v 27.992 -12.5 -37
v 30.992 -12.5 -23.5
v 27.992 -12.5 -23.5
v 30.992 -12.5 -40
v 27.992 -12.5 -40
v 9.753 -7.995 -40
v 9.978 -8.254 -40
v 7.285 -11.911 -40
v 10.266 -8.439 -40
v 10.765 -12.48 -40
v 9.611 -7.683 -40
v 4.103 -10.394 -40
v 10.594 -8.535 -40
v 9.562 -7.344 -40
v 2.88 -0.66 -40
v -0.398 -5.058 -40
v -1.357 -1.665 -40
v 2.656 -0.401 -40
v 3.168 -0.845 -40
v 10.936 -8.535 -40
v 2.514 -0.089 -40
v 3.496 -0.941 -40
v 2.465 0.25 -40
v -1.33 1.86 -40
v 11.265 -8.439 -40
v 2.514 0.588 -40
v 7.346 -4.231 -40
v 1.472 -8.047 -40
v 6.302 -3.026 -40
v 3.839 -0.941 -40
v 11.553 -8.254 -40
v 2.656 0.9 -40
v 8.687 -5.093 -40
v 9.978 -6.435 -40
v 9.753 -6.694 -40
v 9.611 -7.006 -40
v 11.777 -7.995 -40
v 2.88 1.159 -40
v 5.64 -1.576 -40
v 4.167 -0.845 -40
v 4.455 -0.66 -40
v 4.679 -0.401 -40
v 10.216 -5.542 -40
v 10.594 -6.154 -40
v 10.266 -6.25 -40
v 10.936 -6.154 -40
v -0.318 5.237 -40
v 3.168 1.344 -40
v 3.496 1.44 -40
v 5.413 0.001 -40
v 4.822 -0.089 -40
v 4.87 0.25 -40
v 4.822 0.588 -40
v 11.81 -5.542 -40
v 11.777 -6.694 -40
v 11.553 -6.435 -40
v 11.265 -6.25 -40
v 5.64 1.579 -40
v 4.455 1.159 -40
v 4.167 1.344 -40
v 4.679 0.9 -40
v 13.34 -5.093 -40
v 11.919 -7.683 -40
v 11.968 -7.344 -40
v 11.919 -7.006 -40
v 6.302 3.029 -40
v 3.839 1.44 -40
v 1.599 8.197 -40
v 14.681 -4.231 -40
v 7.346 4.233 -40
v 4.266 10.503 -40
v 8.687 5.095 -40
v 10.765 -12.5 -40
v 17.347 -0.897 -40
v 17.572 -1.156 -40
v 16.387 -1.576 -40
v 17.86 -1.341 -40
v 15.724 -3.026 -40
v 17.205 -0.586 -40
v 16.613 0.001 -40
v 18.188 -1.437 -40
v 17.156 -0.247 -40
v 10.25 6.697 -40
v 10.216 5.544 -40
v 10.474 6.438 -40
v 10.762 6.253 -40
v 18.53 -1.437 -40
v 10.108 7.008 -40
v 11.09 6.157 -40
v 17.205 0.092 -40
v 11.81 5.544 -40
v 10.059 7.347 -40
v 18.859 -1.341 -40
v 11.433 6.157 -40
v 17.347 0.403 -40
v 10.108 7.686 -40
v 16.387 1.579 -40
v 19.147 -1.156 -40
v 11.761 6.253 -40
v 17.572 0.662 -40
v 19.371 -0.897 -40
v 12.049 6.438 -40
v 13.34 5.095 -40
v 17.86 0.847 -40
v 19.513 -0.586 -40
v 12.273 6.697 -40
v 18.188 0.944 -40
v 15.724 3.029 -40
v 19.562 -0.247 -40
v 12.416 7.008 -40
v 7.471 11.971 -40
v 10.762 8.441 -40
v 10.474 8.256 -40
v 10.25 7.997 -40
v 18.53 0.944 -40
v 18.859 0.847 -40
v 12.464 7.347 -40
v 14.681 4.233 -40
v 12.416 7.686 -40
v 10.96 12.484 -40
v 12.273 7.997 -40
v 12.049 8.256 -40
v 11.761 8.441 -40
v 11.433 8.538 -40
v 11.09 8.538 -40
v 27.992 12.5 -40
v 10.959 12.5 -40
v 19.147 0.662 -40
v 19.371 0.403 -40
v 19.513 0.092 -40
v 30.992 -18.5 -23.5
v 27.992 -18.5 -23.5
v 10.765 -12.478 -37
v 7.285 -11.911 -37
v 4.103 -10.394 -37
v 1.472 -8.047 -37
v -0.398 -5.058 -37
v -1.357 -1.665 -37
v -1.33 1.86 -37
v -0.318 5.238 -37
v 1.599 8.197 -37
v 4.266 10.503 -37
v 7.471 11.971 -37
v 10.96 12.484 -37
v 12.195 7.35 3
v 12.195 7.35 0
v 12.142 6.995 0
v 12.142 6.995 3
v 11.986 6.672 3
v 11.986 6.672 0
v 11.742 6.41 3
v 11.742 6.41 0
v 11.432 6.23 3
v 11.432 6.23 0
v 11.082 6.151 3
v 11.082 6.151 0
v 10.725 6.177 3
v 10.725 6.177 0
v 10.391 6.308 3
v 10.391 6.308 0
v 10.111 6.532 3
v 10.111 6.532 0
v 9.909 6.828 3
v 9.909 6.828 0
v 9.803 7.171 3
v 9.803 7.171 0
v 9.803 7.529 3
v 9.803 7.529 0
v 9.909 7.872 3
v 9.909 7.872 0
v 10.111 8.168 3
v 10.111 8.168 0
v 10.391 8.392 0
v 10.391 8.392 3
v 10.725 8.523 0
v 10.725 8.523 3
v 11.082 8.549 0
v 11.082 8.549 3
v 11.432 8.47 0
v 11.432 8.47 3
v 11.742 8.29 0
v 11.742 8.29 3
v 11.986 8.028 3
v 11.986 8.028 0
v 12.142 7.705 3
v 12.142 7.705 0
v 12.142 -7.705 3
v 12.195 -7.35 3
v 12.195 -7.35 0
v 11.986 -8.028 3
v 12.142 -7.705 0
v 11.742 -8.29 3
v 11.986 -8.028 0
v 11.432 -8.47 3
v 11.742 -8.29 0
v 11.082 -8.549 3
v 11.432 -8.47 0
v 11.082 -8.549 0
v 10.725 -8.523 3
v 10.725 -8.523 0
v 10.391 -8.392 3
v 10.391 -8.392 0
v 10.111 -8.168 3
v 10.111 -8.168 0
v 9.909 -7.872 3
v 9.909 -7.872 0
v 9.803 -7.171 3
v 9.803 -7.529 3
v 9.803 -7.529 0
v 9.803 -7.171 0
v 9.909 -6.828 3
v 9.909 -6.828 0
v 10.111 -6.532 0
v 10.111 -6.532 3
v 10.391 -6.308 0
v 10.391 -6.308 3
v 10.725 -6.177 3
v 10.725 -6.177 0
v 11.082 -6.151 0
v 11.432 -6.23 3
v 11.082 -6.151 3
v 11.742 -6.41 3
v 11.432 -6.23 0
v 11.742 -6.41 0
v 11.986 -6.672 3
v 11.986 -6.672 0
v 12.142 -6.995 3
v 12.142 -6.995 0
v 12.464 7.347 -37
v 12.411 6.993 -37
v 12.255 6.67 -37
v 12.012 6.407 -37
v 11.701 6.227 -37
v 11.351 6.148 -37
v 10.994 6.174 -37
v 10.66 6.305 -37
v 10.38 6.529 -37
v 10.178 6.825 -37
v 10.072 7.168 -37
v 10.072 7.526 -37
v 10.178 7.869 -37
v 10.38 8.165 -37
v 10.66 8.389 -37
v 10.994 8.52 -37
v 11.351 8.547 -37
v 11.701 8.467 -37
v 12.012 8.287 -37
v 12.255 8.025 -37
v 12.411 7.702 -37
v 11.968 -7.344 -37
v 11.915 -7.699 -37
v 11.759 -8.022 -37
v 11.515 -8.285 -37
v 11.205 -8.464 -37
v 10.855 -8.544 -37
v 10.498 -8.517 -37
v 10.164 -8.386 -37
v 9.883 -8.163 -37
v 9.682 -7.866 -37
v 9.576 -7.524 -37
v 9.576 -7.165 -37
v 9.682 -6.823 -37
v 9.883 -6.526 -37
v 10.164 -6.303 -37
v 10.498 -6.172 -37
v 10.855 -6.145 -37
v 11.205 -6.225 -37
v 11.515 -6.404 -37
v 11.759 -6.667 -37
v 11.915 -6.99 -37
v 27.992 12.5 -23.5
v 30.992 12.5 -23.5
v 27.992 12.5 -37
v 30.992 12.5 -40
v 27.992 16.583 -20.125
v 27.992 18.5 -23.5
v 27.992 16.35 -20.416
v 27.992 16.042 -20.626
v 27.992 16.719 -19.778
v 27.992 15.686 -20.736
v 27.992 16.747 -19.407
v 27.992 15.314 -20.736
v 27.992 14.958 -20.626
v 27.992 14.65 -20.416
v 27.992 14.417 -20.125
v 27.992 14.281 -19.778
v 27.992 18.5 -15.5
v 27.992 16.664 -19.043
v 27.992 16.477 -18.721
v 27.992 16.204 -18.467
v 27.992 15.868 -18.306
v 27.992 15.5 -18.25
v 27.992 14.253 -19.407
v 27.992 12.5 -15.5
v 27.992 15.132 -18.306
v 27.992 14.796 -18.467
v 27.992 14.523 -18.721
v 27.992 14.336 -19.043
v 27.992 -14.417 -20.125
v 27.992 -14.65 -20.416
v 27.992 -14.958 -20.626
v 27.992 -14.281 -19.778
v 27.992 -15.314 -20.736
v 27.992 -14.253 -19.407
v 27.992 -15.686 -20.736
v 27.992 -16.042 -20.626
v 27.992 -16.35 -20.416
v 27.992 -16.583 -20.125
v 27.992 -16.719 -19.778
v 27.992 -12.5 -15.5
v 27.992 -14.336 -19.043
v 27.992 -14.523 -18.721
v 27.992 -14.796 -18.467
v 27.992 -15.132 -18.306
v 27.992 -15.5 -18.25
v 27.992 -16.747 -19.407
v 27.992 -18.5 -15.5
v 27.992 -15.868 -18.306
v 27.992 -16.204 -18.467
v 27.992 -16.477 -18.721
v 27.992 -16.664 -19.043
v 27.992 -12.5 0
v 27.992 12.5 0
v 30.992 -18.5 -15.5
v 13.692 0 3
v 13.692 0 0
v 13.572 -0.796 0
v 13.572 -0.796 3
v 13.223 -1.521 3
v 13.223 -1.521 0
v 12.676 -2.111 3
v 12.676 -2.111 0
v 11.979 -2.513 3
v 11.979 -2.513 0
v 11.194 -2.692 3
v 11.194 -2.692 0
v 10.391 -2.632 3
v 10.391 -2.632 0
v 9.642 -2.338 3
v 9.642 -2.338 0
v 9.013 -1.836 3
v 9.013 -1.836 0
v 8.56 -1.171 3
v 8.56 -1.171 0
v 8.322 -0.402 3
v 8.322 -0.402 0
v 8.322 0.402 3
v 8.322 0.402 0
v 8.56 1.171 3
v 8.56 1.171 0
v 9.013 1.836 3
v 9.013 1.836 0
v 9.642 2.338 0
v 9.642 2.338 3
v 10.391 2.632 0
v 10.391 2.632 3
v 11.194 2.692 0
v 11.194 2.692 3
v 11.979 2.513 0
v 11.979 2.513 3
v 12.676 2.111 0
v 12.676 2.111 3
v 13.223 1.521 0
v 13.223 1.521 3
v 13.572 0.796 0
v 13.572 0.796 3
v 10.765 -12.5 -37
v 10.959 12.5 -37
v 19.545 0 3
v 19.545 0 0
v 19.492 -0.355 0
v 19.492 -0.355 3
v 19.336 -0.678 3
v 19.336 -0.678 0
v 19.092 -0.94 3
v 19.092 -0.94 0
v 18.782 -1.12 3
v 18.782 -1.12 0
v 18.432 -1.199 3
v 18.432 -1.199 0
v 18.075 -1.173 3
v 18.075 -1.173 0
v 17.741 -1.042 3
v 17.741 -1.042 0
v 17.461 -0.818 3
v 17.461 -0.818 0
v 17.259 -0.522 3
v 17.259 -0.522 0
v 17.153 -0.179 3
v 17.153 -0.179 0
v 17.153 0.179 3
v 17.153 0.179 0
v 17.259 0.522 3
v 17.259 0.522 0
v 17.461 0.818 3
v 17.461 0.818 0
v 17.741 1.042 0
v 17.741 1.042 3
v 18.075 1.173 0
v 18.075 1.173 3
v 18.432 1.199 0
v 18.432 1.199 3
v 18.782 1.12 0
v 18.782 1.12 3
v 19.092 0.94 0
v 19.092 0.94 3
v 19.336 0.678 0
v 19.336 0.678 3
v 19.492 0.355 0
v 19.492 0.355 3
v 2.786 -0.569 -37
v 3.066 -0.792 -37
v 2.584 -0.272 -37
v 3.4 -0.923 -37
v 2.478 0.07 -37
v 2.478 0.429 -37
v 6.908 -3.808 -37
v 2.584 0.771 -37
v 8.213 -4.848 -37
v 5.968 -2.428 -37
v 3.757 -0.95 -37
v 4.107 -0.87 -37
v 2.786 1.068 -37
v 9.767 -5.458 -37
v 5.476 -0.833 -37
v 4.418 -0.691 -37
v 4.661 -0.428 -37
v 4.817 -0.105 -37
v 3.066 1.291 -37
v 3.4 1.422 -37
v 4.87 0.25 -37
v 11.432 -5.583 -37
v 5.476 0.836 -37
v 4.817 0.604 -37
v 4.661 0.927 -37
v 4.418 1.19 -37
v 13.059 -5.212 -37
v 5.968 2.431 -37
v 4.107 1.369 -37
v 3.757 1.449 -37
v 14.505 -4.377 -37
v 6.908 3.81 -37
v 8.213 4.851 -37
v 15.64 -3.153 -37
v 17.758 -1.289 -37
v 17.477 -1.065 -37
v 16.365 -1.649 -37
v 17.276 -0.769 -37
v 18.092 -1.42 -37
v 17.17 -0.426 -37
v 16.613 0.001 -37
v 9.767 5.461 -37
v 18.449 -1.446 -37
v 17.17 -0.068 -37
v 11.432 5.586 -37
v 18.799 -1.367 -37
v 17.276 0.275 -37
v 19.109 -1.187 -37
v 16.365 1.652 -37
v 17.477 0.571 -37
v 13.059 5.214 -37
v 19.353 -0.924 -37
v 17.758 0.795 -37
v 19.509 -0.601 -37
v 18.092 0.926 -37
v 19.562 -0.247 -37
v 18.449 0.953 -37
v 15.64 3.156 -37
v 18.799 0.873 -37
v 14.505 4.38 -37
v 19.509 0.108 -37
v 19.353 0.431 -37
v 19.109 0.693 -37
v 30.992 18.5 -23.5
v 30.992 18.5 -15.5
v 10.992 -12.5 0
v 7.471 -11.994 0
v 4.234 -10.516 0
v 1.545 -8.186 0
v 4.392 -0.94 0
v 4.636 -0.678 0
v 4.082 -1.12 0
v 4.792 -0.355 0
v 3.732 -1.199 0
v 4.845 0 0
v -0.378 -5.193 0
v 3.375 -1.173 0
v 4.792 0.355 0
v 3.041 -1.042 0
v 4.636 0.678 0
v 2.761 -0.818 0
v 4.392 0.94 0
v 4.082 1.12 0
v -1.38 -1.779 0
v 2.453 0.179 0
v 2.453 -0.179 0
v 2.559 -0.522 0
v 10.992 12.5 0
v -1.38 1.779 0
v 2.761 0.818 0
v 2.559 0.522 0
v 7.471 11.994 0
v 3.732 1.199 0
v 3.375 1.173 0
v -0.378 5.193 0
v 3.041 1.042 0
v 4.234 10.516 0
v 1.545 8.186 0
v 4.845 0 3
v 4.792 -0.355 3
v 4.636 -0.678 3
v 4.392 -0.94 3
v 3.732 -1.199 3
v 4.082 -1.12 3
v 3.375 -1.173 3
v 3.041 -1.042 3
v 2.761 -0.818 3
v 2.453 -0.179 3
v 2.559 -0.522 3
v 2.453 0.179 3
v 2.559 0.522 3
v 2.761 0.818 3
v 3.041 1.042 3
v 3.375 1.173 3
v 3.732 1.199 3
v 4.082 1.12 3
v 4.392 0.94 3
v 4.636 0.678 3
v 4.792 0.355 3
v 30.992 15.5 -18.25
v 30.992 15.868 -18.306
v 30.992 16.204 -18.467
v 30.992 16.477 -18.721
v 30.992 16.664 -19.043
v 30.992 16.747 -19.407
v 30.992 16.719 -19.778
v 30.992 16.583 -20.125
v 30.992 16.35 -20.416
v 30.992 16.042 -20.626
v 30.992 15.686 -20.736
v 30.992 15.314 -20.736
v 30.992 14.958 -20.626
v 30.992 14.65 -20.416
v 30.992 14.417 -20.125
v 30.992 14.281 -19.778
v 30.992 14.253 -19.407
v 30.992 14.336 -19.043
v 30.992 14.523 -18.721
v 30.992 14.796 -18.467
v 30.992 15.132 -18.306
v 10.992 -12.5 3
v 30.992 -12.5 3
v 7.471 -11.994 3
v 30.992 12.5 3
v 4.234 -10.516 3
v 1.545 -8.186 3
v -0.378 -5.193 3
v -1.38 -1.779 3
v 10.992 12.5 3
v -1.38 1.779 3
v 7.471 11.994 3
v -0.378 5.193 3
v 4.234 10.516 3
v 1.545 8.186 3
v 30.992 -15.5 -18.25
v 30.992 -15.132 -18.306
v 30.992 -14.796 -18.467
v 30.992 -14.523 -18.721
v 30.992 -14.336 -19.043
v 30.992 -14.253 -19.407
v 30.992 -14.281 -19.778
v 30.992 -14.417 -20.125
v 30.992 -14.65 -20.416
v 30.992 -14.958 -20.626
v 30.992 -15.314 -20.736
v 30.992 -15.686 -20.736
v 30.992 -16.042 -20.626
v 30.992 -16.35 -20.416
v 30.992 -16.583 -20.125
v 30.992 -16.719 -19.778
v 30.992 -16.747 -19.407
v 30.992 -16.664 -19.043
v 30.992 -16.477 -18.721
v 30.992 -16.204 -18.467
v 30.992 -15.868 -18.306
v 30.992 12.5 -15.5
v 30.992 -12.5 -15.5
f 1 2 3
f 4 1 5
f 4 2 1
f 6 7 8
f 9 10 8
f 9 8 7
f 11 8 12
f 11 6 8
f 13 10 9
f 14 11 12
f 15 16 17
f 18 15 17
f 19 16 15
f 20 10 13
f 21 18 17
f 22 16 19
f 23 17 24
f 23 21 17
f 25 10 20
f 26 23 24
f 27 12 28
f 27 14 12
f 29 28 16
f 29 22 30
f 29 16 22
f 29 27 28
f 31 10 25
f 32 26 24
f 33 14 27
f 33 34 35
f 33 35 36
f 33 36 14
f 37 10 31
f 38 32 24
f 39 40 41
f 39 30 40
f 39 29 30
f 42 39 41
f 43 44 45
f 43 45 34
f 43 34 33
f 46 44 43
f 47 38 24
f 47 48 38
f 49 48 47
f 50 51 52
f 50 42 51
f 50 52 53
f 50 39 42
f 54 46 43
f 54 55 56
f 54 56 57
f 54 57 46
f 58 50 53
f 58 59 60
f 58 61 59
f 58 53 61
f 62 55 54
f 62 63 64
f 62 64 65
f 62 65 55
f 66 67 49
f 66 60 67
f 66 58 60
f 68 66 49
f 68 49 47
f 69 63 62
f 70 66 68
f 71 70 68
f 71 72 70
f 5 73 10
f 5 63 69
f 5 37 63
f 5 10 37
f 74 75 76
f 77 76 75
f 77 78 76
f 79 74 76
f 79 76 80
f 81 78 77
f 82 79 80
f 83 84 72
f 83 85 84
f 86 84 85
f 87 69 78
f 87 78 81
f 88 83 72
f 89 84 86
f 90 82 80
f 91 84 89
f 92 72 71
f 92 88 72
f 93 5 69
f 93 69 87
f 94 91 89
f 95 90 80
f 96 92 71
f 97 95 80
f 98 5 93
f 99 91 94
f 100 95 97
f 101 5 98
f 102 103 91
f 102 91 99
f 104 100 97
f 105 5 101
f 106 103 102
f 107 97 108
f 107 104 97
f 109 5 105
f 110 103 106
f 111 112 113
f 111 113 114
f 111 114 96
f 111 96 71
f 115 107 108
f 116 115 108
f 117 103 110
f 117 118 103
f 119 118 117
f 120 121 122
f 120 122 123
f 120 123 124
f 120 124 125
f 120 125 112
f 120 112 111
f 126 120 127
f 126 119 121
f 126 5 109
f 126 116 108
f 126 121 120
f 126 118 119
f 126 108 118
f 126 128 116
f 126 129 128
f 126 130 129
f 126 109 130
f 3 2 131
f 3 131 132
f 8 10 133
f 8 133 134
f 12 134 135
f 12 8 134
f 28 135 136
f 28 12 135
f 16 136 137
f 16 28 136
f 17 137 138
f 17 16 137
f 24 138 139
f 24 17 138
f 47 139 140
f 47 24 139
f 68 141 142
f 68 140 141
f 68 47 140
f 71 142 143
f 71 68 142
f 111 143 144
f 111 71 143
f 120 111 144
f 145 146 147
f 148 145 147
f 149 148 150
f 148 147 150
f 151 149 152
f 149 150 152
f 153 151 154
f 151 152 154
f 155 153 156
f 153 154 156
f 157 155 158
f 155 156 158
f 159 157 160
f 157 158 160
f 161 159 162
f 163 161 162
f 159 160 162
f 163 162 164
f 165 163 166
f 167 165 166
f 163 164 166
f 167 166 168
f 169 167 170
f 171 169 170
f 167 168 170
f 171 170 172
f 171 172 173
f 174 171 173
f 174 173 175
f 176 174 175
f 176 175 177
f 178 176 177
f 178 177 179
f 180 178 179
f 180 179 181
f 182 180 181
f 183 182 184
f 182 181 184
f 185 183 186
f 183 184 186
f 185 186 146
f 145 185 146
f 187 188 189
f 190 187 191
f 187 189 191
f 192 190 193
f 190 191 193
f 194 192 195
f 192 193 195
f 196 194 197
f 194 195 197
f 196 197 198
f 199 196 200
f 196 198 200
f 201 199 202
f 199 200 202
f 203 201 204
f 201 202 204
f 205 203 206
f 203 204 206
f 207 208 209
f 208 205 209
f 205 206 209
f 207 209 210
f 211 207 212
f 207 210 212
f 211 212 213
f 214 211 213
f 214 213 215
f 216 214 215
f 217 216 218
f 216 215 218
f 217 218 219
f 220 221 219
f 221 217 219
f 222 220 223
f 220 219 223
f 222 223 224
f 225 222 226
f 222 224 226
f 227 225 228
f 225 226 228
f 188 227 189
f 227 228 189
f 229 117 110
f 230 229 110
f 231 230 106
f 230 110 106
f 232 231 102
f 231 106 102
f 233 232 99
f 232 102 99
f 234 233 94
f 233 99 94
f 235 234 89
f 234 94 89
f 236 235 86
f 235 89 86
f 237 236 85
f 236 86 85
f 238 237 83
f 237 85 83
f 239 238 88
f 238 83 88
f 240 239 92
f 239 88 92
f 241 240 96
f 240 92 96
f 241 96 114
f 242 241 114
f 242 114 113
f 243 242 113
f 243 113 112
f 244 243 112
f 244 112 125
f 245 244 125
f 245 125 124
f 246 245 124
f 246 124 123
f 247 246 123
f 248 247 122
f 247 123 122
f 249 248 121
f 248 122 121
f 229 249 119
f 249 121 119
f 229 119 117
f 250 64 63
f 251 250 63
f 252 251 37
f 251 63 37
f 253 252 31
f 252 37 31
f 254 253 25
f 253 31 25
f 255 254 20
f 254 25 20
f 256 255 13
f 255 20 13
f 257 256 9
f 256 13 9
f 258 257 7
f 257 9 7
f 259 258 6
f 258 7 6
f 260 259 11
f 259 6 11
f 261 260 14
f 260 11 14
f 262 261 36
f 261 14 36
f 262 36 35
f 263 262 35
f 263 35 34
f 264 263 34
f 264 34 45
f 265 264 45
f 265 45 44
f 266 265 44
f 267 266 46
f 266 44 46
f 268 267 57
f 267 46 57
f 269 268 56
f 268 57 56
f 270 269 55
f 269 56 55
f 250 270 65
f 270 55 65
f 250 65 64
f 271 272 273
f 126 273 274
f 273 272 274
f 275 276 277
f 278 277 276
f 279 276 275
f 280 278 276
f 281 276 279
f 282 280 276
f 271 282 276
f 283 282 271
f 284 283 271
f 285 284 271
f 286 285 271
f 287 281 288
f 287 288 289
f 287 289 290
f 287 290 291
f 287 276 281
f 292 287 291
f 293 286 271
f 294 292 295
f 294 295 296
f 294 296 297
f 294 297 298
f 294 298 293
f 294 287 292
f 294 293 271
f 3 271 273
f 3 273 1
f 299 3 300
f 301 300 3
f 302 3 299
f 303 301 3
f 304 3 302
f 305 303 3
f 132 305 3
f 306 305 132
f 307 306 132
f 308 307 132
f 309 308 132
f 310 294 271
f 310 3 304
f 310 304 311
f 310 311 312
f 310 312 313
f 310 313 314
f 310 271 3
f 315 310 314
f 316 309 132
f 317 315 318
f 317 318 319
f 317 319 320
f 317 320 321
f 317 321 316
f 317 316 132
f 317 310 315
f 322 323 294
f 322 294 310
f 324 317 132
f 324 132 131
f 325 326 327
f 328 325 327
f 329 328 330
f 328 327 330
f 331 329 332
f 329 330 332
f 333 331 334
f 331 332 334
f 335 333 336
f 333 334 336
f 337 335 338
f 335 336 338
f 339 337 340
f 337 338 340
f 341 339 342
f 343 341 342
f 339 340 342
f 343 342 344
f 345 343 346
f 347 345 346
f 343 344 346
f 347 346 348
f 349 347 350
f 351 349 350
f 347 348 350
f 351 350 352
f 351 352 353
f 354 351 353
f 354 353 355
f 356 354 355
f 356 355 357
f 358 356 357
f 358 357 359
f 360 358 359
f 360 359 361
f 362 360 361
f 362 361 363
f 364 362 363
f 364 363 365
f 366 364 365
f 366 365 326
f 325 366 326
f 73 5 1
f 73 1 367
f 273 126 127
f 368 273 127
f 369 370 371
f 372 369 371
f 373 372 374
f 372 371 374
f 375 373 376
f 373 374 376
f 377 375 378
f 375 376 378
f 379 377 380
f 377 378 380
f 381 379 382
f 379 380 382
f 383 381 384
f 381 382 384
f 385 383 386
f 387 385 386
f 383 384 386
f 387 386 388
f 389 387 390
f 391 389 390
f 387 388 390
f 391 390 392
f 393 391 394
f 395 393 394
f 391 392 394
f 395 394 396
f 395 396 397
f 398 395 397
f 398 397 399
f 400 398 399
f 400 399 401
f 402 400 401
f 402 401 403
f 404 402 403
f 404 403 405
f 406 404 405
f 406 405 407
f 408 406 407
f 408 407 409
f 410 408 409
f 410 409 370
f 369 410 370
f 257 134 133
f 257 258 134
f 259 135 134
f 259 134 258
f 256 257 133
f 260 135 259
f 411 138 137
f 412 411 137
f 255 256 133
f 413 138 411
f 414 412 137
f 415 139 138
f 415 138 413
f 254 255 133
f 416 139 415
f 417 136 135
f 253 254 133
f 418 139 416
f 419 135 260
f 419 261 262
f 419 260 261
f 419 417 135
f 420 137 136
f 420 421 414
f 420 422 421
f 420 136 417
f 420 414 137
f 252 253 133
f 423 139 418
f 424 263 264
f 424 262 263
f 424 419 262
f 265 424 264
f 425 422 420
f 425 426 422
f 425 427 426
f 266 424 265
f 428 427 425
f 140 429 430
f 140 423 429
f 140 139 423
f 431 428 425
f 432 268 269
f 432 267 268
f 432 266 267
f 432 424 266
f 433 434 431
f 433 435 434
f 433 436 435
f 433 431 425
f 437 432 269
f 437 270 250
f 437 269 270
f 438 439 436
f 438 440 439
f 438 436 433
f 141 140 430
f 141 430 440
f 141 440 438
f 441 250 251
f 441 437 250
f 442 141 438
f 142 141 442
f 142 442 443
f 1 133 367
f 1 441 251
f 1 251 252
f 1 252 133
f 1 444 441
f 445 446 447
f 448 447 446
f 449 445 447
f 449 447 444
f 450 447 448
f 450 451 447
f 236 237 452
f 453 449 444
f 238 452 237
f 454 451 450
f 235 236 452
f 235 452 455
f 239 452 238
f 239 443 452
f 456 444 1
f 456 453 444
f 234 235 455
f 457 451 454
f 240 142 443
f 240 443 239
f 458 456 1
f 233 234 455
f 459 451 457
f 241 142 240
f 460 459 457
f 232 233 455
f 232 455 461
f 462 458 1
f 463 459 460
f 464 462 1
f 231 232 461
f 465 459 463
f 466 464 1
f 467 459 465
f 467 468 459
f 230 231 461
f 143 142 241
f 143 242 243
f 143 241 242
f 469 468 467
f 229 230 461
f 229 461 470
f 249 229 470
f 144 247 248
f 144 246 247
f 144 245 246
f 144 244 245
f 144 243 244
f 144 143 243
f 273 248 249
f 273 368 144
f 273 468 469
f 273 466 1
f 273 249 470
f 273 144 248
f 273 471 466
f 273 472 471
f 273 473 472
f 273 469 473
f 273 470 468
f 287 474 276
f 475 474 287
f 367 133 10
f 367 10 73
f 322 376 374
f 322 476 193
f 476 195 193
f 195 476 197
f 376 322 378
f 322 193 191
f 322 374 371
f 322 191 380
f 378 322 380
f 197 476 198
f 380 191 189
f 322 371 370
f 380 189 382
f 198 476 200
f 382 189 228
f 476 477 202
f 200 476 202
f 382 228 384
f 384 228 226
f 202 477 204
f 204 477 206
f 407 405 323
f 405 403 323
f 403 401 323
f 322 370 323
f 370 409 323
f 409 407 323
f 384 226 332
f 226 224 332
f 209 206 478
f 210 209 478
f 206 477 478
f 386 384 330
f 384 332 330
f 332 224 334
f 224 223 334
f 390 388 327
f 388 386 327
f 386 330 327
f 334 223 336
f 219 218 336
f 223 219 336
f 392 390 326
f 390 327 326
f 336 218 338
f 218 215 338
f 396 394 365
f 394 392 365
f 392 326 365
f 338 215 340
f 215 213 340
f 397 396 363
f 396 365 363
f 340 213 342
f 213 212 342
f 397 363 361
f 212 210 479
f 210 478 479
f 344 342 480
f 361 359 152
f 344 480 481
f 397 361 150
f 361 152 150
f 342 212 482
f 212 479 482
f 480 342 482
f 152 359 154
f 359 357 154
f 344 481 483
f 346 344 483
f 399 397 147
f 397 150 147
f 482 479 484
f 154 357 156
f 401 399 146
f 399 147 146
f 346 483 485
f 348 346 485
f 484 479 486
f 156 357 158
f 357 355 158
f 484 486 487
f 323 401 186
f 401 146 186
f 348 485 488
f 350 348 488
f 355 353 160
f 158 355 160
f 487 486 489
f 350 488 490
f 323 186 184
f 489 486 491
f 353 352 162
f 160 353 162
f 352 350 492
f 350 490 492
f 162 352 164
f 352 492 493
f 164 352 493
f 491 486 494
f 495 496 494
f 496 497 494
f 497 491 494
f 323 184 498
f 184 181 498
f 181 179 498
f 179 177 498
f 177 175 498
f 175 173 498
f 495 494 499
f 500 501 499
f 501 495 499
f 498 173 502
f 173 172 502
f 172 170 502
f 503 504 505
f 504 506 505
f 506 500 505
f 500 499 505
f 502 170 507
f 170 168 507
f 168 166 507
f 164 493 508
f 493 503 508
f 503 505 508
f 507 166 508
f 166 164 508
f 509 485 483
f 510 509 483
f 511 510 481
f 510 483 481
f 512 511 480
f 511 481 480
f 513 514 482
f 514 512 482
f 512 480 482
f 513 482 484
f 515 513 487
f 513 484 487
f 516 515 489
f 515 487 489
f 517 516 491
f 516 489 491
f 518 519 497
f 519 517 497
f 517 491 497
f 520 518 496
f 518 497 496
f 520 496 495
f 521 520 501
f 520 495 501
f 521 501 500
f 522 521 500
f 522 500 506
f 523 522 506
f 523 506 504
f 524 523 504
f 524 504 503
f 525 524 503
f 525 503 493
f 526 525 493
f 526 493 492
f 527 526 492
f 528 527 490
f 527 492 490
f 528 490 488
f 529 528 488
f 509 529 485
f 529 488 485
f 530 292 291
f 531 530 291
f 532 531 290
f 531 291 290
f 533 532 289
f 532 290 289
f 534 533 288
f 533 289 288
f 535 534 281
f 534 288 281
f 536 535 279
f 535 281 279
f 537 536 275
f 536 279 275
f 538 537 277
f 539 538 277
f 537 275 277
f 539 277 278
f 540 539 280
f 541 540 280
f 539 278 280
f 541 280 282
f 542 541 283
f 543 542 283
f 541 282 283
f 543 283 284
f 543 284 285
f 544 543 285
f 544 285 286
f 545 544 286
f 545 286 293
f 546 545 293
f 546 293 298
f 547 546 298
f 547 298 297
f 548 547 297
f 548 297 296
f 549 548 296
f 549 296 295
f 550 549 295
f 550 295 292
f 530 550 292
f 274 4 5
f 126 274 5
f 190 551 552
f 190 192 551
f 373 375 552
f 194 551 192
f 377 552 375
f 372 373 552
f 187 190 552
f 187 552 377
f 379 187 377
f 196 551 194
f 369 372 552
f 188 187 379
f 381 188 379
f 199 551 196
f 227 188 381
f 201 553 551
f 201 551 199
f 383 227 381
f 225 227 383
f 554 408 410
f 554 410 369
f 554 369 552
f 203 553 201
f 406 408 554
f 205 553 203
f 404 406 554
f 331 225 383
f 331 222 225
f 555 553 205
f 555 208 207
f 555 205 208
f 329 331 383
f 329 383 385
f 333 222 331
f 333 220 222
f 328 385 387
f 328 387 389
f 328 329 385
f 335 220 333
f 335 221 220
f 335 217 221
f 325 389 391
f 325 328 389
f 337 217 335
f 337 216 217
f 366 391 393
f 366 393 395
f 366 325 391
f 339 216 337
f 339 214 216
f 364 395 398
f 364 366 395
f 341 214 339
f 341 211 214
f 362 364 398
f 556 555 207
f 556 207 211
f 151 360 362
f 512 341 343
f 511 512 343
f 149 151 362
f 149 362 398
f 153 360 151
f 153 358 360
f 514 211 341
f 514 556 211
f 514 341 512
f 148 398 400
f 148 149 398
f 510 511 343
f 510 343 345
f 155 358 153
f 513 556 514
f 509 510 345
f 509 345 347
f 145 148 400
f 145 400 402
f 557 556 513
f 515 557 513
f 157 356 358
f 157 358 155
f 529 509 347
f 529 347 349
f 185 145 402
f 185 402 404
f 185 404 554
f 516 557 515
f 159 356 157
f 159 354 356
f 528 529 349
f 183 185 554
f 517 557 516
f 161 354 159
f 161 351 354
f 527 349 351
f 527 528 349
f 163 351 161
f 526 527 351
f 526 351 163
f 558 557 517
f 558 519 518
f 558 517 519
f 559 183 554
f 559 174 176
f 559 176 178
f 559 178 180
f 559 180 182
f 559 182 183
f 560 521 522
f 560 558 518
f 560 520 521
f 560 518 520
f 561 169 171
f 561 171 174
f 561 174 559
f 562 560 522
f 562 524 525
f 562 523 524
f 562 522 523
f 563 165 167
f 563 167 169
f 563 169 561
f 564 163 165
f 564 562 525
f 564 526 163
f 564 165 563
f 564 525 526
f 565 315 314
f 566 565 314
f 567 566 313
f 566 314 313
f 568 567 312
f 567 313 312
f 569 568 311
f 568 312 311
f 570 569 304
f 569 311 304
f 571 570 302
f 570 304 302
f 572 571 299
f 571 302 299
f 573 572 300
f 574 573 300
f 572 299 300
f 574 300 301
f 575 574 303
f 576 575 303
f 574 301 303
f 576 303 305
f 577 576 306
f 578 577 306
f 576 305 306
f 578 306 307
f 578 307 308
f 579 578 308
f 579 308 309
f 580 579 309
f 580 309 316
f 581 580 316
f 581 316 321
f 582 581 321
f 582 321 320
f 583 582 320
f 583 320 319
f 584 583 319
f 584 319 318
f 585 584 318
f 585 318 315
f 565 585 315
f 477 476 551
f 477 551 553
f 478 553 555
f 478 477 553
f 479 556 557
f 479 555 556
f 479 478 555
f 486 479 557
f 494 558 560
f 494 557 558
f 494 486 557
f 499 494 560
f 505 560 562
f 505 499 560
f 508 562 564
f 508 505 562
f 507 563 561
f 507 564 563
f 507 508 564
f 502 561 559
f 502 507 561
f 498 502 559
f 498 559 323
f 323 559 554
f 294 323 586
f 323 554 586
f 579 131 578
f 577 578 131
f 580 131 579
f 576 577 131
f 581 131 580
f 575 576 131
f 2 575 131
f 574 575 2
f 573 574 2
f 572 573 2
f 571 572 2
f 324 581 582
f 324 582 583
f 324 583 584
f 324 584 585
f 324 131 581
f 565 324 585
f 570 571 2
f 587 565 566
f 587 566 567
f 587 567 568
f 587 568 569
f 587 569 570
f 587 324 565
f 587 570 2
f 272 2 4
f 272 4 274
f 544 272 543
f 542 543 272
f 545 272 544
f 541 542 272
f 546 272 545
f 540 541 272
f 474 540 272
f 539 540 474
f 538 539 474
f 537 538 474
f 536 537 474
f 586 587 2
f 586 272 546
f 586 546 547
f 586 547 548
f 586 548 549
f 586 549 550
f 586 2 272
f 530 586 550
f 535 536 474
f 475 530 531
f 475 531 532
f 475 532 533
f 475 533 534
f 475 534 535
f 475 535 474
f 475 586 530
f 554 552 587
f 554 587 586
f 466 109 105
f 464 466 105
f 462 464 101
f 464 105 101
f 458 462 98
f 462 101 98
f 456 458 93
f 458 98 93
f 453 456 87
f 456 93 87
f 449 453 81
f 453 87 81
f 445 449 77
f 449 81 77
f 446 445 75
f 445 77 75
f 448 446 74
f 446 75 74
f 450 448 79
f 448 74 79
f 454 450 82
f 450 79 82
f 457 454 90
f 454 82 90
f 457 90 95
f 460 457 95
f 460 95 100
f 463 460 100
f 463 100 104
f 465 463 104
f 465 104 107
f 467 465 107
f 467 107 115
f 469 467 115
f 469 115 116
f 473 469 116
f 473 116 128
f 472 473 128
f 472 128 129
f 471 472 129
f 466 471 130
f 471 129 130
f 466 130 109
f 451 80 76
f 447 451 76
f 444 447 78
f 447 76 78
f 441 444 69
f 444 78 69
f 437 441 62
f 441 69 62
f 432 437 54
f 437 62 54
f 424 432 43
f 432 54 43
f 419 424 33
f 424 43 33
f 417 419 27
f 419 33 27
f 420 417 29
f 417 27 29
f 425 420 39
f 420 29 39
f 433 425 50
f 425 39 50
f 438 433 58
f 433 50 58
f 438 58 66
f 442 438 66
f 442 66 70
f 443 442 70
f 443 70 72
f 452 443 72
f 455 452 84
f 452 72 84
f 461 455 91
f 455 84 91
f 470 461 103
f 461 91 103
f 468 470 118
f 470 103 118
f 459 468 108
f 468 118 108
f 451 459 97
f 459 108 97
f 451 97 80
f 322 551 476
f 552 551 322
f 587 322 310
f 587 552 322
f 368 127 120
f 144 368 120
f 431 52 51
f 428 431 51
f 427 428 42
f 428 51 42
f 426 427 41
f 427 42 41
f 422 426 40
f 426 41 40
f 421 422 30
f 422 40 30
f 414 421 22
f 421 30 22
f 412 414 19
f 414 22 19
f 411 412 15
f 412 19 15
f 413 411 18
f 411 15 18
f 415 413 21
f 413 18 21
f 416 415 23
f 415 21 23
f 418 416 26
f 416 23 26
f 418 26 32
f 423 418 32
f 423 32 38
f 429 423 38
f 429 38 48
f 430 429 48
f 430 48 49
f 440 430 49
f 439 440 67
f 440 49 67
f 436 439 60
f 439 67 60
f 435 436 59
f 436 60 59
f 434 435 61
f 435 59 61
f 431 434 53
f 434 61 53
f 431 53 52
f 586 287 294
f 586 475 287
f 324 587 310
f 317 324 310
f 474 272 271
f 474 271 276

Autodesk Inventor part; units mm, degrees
ref_plane "YZ Plane" through (0, 0, 0) normal (1, 0, 0) x (0, 1, 0)
ref_plane "XZ Plane" through (0, 0, 0) normal (0, 1, 0) x (-1, 0, 0)
ref_plane "XY Plane" through (0, 0, 0) normal (0, 0, 1) x (1, 0, 0)
ref_plane "Plano de trabajo1" through (0, 0, 0) normal (0, 0, 1) x (1, 0, 0)
sketch "Boceto1" plane through (0, 0, 0) normal (0, 0, 1) x (1, 0, 0)
  circle A0 centre (18.3423, 0) radius 1.2028 projected
  circle A1 centre (3.6423, 0) radius 1.2028 projected
  circle A2 centre (10.9923, -7.35) radius 1.2028 projected
  circle A3 centre (10.9923, 7.35) radius 1.2028 projected
  circle A4 centre (10.9923, 0) radius 10.9823 projected
  circle A5 centre (10.9923, 0) radius 2.7 projected
  circle A6 centre (10.9923, 0) radius 12.5
  line L0 (10.9923, 0) -> (22.9923, 0)
  line L1 (10.9923, 0) -> (10.9923, 12.5)
  line L2 (10.9923, 12.5) -> (22.9923, 12.5)
  line L3 (10.9923, 0) -> (10.9923, -12.5)
  line L4 (10.9923, -12.5) -> (22.9923, -12.5)
  line L5 (22.9923, -12.5) -> (22.9923, 12.5)
  point P0 (0, 0)
  dimension "d0" = 25
  dimension "d1" = 12
  dimension "d2" = 12
extrude "Extrusión1" add sketch "Boceto1" along normal blind 3 contours L0 A4 L3 A2 A5 A0 | A0 L0 A5 L1 A3 A4 | L0 L5 A6 L3 A4 | A4 L1 A6 L5 L0 | L1 A3 A5 L3 A2 A4 | A4 L3 A6 L1 | L2 L5 A6 | A6 L5 L4
sketch "Boceto2" plane through (22.9923, -12.5, 0) normal (1, 0, 0) x (0, 0, -1)
  line L0 (0, 0) -> (0, 25) projected
  line L1 (0, 25) -> (-3, 25) projected
  line L2 (-3, 0) -> (-3, 25) projected
  line L3 (0, 0) -> (-3, 0) projected
  point P0 (0, 12.5)
extrude "Extrusión2" add sketch "Boceto2" along normal blind 8
sketch "Boceto3" plane through (0, 0, 0) normal (0, 0, -1) x (-1, 0, 0)
  line L0 (-10.9923, -12.5) -> (-30.9923, -12.5) projected
  arc A0 (-10.9923, -12.5) -> (-10.9923, 12.5) centre (-10.9923, 0) ccw projected
  line L1 (-10.9923, 12.5) -> (-30.9923, 12.5) projected
  line L2 (-30.9923, -12.5) -> (-30.9923, 12.5) projected
  circle A1 centre (-10.9923, 0) radius 2.7 projected
  circle A2 centre (-10.9923, 7.35) radius 1.2028 projected
  circle A3 centre (-18.3423, 0) radius 1.2028 projected
  circle A4 centre (-3.6423, 0) radius 1.2028 projected
  circle A5 centre (-10.9923, -7.35) radius 1.2028 projected
  line L3 (-30.9923, 12.5) -> (-27.9923, 12.5)
  line L4 (-27.9923, 12.5) -> (-27.9923, -12.5)
  line L5 (-27.9923, -12.5) -> (-30.9923, -12.5)
  line L6 (-30.9923, -12.5) -> (-30.9923, 12.5)
  point P0 (0, 0)
  dimension "d7" = 3
extrude "Extrusión3" add sketch "Boceto3" along normal blind 42 contours L0 L2 L1 L4
sketch "Boceto4" plane through (27.9923, -12.5, 0) normal (-1, 0, 0) x (0, 0, 1)
  line L0 (-42, 0) -> (-42, 25) projected
  line L1 (0, 25) -> (0, 0) projected
  line L2 (0, 25) -> (-42, 25) projected
  line L3 (-42, 0) -> (-42, 25) projected
  line L4 (0, 0) -> (-42, 0) projected
  line L5 (-42, 0) -> (-40, 0)
  line L6 (-40, 0) -> (-40, 25)
  line L7 (-40, 25) -> (-42, 25)
  line L8 (-42, 25) -> (-42, 0)
  point P0 (0, 12.5)
  dimension "d10" = 2
extrude "Extrusión4" add sketch "Boceto4" along normal blind 30 contours L0 L2 L6 L4
sketch "Boceto5" plane through (0, 0, -42) normal (0, 0, -1) x (-1, 0, 0)
  line L0 (24.4501, 12.6367) -> (24.5578, -12.3277) projected
  line L1 (-11.0672, 12.4835) -> (24.4501, 12.6367) projected
  arc A0 (-11.0672, 12.4835) -> (-10.9596, -12.4809) centre (-11.0134, 0.0013) ccw projected
  line L2 (-10.9596, -12.4809) -> (24.5578, -12.3277) projected
  circle A1 centre (-3.6676, 0.2495) radius 1.2028 projected
  circle A2 centre (-11.0134, 0.0013) radius 2.7 projected
  circle A3 centre (-10.7652, -7.3445) radius 1.2028 projected
  circle A4 centre (-11.2616, 7.3471) radius 1.2028 projected
  circle A5 centre (-18.3592, -0.2469) radius 1.2028 projected
  line L3 (-30.9923, 12.5) -> (2.0077, 12.5) projected
  line L4 (-11.0672, 12.4835) -> (2.0077, 12.5)
  line L5 (2.0391, -12.4248) -> (2.0077, 12.5)
  line L6 (-10.9596, -12.4809) -> (2.0391, -12.4248)
  line L7 (-11.0672, 12.4835) -> (2.0077, 12.5)
  circle A6 centre (-11.0134, 0.0013) radius 12.4823
  line L8 (-10.7652, -7.3445) -> (-10.7652, -14.8497)
  line L9 (-10.7652, -14.8497) -> (6.2045, -14.8497)
  line L10 (6.2045, -14.8497) -> (6.2045, 15.7882)
  line L11 (6.2045, 15.7882) -> (-10.7652, 15.7882)
  line L12 (-10.7652, 15.7882) -> (-11.2616, 7.3471)
  point P0 (0, 0)
  point P1 (-7.2489, 12.5)
  point P2 (-10.991, 12.4836)
  point P3 (-10.9817, -12.481)
  point P4 (-10.9586, 12.5)
  point P5 (6.2045, 12.558)
  point P6 (6.2045, -12.4069)
  point P7 (-10.7652, -12.48)
  point P8 (-10.9595, 12.484)
  point P9 (-10.9595, 12.4837)
  point P10 (-10.9596, 12.4835)
  point P11 (-10.991, 12.4836)
  point P12 (-10.7652, -12.4785)
  point P13 (-11.0672, 12.4835)
extrude "Extrusión5" cut sketch "Boceto5" against normal blind 25 contours L10 L2 L5 L3 L1 | L1 L3 L12 L11 L10 | L10 L9 L8 L2 | L3 L4 L1 | L1 L12 L3 | L2 A6 L4 L5 | A3 | A4 | A1 | A2 | A5
sketch "Boceto8" plane through (10.9923, -12.5, 0) normal (0, -1, 0) x (1, 0, 0)
  line L0 (-0.2271, -40) -> (-0.2271, -42) projected
  line L1 (20, -42) -> (-0.2271, -42) projected
  line L2 (20, 3) -> (20, -42) projected
  line L3 (0, 3) -> (20, 3) projected
  line L4 (0, 0) -> (0, 3) projected
  line L5 (0, 0) -> (17, 0) projected
  line L6 (17, 0) -> (17, -40) projected
  line L7 (17, -40) -> (-0.2271, -40) projected
  line L8 (20, -42) -> (20, -19.5)
  line L9 (20, 3) -> (20, -42) projected
  line L10 (20, -19.5) -> (20, -23.5)
  line L11 (20, -23.5) -> (20, -15.5)
  line L12 (20, -15.5) -> (17, -15.5)
  line L13 (20, -23.5) -> (17, -23.5)
  point P0 (-10.9923, 0)
  dimension "d29" = 22.5
  dimension "d30" = 4
  dimension "d31" = 8
extrude "Extrusión8" add sketch "Boceto8" along normal blind 6 contours L6 L12 L2 L13
ref_plane "Plano de trabajo2" through (-0.8313, -11.6464, -27.56) normal (0.0048, -1, 0) x (1, 0.0048, 0)
sketch "Boceto9" plane through (30.9923, -12.5, 0) normal (1, 0, 0) x (0, 0, -1)
  line L0 (-3, 25) -> (42, 25) projected
  line L1 (-3, 25) -> (-3, 0) projected
  line L2 (-3, 0) -> (15.5, 0) projected
  line L3 (15.5, 0) -> (15.5, -6) projected
  line L4 (23.5, -6) -> (15.5, -6) projected
  line L5 (23.5, 0) -> (23.5, -6) projected
  line L6 (23.5, 0) -> (42, 0) projected
  line L7 (42, 25) -> (42, 0) projected
  line L8 (23.5, 0) -> (23.5, 25)
  line L9 (23.5, 25) -> (23.5, 31)
  line L10 (23.5, 31) -> (15.5, 31)
  line L11 (15.5, 31) -> (15.5, 25)
  point P0 (0, 12.5)
  dimension "d34" = 6
extrude "Extrusión9" add sketch "Boceto9" against normal blind 3 contours L11 L10 L9 L0
sketch "Boceto10" plane through (27.9923, -12.5, 0) normal (-1, 0, 0) x (0, 0, 1)
  line L0 (-40, 25) -> (-40, 0) projected
  line L1 (-23.5, 0) -> (-40, 0) projected
  line L2 (-23.5, 0) -> (-23.5, -6) projected
  line L3 (-15.5, -6) -> (-23.5, -6) projected
  line L4 (-15.5, 0) -> (-15.5, -6) projected
  line L5 (0, 0) -> (-15.5, 0) projected
  line L6 (0, 25) -> (0, 0) projected
  line L7 (0, 25) -> (-15.5, 25) projected
  line L8 (-15.5, 25) -> (-15.5, 31) projected
  line L9 (-15.5, 31) -> (-23.5, 31) projected
  line L10 (-23.5, 31) -> (-23.5, 25) projected
  line L11 (-23.5, 25) -> (-40, 25) projected
  line L12 (-15.5, -3) -> (-19.5, -3)
  line L13 (-19.5, -3) -> (-19.5, 28)
  circle A0 centre (-19.5, -3) radius 1.25
  circle A1 centre (-19.5, 28) radius 1.25
  point P0 (0, 12.5)
  dimension "d37" = 2.5
  dimension "d38" = 2.5
extrude "Extrusión10" cut sketch "Boceto10" against normal blind 3 contours A1 | A0 L13 L12 | L12 L13 A0
sketch "Boceto11" plane through (27.9923, -12.5, 0) normal (-1, 0, 0) x (0, 0, 1)
  line L0 (-42, 25) -> (-42, 0) projected
  line L1 (-42, 25) -> (-42, 12.5)
  line L2 (-42, 12.5) -> (-19.5, 12.5)
  line L3 (3, 13.7028) -> (3, 11.2972) projected
  line L4 (-19.5, 12.5) -> (-19.5, 25)
  point P0 (0, 12.5)
  dimension "d41" = 12.5
  dimension "d42" = 22.5
sketch "Boceto12" plane through (27.9923, -12.5, -40) normal (0, 0, 1) x (1, 0, 0)
  circle A0 centre (-16.9789, 12.5013) radius 5.6 projected
  circle A1 centre (-16.9789, 12.5013) radius 5.6 projected
  circle A2 centre (-16.9789, 12.5013) radius 2.7 projected
  point P0 (-27.9923, 12.5)
extrude "Extrusión11" cut sketch "Boceto12" against normal blind 10
sketch "Boceto13" plane through (27.9923, -12.5, -40) normal (0, 0, 1) x (1, 0, 0)
  circle A0 centre (-16.9789, 12.5013) radius 5.6 projected
  line L0 (-17.0337, 25) -> (-17.0328, 24.9835) projected
  arc A1 (-17.0328, 24.9835) -> (-17.2271, 0.0215) centre (-16.9789, 12.5013) ccw projected
  line L1 (-17.2271, 0.0215) -> (-17.2271, 0) projected
  line L2 (0, 0) -> (-17.2271, 0) projected
  line L3 (0, 25) -> (0, 0) projected
  line L4 (0, 25) -> (-17.0337, 25) projected
  circle A2 centre (-9.6331, 12.2531) radius 1.2028 projected
  circle A3 centre (-16.7307, 19.8471) radius 1.2028 projected
  circle A4 centre (-17.2271, 5.1555) radius 1.2028 projected
  circle A5 centre (-24.3247, 12.7495) radius 1.2028 projected
  point P0 (-27.9923, 12.5)
extrude "Extrusión12" add sketch "Boceto13" along normal blind 6
sketch "Boceto15" plane through (27.9923, -12.5, -34) normal (0, 0, 1) x (1, 0, 0)
  line L0 (-17.0337, 25) -> (-17.0328, 24.9835) projected
  arc A0 (-17.0328, 24.9835) -> (-17.2271, 0.0215) centre (-16.9789, 12.5013) ccw projected
  line L1 (-17.2271, 0.0215) -> (-17.2271, 0) projected
  line L2 (-17.2271, 0) -> (0, 0) projected
  line L3 (0, 25) -> (0, 0) projected
  line L4 (0, 25) -> (-17.0337, 25) projected
  circle A1 centre (-9.6331, 12.2531) radius 1.2028 projected
  circle A2 centre (-24.3247, 12.7495) radius 1.2028 projected
  circle A3 centre (-17.2271, 5.1555) radius 1.2028 projected
  circle A4 centre (-16.7307, 19.8471) radius 1.2028 projected
  circle A5 centre (-16.9789, 12.5013) radius 5.6 projected
  point P0 (-27.9923, 12.5)
extrude "Extrusión14" cut sketch "Boceto15" against normal blind 3
sketch "Boceto16" plane through (0, 0, -42) normal (0, 0, -1) x (-1, 0, 0)
  circle A0 centre (-11.0134, 0.0013) radius 5.6 projected
  line L0 (-10.9596, 12.4835) -> (-10.9586, 12.5) projected
  line L1 (-30.9923, 12.5) -> (-10.9586, 12.5) projected
  line L2 (-30.9923, 12.5) -> (-30.9923, -12.5) projected
  line L3 (-30.9923, -12.5) -> (-10.7652, -12.5) projected
  line L4 (-10.7652, -12.5) -> (-10.7652, -12.4785) projected
  arc A1 (-10.7652, -12.4785) -> (-10.9596, 12.4835) centre (-11.0134, 0.0013) ccw projected
  circle A2 centre (-3.6676, 0.2495) radius 1.2028 projected
  circle A3 centre (-10.7652, -7.3445) radius 1.2028 projected
  circle A4 centre (-11.2616, 7.3471) radius 1.2028 projected
  circle A5 centre (-18.3592, -0.2469) radius 1.2028 projected
  point P0 (0, 0)
extrude "Extrusión15" cut sketch "Boceto16" against normal blind 2
properties part number "UnionCuerpo"
